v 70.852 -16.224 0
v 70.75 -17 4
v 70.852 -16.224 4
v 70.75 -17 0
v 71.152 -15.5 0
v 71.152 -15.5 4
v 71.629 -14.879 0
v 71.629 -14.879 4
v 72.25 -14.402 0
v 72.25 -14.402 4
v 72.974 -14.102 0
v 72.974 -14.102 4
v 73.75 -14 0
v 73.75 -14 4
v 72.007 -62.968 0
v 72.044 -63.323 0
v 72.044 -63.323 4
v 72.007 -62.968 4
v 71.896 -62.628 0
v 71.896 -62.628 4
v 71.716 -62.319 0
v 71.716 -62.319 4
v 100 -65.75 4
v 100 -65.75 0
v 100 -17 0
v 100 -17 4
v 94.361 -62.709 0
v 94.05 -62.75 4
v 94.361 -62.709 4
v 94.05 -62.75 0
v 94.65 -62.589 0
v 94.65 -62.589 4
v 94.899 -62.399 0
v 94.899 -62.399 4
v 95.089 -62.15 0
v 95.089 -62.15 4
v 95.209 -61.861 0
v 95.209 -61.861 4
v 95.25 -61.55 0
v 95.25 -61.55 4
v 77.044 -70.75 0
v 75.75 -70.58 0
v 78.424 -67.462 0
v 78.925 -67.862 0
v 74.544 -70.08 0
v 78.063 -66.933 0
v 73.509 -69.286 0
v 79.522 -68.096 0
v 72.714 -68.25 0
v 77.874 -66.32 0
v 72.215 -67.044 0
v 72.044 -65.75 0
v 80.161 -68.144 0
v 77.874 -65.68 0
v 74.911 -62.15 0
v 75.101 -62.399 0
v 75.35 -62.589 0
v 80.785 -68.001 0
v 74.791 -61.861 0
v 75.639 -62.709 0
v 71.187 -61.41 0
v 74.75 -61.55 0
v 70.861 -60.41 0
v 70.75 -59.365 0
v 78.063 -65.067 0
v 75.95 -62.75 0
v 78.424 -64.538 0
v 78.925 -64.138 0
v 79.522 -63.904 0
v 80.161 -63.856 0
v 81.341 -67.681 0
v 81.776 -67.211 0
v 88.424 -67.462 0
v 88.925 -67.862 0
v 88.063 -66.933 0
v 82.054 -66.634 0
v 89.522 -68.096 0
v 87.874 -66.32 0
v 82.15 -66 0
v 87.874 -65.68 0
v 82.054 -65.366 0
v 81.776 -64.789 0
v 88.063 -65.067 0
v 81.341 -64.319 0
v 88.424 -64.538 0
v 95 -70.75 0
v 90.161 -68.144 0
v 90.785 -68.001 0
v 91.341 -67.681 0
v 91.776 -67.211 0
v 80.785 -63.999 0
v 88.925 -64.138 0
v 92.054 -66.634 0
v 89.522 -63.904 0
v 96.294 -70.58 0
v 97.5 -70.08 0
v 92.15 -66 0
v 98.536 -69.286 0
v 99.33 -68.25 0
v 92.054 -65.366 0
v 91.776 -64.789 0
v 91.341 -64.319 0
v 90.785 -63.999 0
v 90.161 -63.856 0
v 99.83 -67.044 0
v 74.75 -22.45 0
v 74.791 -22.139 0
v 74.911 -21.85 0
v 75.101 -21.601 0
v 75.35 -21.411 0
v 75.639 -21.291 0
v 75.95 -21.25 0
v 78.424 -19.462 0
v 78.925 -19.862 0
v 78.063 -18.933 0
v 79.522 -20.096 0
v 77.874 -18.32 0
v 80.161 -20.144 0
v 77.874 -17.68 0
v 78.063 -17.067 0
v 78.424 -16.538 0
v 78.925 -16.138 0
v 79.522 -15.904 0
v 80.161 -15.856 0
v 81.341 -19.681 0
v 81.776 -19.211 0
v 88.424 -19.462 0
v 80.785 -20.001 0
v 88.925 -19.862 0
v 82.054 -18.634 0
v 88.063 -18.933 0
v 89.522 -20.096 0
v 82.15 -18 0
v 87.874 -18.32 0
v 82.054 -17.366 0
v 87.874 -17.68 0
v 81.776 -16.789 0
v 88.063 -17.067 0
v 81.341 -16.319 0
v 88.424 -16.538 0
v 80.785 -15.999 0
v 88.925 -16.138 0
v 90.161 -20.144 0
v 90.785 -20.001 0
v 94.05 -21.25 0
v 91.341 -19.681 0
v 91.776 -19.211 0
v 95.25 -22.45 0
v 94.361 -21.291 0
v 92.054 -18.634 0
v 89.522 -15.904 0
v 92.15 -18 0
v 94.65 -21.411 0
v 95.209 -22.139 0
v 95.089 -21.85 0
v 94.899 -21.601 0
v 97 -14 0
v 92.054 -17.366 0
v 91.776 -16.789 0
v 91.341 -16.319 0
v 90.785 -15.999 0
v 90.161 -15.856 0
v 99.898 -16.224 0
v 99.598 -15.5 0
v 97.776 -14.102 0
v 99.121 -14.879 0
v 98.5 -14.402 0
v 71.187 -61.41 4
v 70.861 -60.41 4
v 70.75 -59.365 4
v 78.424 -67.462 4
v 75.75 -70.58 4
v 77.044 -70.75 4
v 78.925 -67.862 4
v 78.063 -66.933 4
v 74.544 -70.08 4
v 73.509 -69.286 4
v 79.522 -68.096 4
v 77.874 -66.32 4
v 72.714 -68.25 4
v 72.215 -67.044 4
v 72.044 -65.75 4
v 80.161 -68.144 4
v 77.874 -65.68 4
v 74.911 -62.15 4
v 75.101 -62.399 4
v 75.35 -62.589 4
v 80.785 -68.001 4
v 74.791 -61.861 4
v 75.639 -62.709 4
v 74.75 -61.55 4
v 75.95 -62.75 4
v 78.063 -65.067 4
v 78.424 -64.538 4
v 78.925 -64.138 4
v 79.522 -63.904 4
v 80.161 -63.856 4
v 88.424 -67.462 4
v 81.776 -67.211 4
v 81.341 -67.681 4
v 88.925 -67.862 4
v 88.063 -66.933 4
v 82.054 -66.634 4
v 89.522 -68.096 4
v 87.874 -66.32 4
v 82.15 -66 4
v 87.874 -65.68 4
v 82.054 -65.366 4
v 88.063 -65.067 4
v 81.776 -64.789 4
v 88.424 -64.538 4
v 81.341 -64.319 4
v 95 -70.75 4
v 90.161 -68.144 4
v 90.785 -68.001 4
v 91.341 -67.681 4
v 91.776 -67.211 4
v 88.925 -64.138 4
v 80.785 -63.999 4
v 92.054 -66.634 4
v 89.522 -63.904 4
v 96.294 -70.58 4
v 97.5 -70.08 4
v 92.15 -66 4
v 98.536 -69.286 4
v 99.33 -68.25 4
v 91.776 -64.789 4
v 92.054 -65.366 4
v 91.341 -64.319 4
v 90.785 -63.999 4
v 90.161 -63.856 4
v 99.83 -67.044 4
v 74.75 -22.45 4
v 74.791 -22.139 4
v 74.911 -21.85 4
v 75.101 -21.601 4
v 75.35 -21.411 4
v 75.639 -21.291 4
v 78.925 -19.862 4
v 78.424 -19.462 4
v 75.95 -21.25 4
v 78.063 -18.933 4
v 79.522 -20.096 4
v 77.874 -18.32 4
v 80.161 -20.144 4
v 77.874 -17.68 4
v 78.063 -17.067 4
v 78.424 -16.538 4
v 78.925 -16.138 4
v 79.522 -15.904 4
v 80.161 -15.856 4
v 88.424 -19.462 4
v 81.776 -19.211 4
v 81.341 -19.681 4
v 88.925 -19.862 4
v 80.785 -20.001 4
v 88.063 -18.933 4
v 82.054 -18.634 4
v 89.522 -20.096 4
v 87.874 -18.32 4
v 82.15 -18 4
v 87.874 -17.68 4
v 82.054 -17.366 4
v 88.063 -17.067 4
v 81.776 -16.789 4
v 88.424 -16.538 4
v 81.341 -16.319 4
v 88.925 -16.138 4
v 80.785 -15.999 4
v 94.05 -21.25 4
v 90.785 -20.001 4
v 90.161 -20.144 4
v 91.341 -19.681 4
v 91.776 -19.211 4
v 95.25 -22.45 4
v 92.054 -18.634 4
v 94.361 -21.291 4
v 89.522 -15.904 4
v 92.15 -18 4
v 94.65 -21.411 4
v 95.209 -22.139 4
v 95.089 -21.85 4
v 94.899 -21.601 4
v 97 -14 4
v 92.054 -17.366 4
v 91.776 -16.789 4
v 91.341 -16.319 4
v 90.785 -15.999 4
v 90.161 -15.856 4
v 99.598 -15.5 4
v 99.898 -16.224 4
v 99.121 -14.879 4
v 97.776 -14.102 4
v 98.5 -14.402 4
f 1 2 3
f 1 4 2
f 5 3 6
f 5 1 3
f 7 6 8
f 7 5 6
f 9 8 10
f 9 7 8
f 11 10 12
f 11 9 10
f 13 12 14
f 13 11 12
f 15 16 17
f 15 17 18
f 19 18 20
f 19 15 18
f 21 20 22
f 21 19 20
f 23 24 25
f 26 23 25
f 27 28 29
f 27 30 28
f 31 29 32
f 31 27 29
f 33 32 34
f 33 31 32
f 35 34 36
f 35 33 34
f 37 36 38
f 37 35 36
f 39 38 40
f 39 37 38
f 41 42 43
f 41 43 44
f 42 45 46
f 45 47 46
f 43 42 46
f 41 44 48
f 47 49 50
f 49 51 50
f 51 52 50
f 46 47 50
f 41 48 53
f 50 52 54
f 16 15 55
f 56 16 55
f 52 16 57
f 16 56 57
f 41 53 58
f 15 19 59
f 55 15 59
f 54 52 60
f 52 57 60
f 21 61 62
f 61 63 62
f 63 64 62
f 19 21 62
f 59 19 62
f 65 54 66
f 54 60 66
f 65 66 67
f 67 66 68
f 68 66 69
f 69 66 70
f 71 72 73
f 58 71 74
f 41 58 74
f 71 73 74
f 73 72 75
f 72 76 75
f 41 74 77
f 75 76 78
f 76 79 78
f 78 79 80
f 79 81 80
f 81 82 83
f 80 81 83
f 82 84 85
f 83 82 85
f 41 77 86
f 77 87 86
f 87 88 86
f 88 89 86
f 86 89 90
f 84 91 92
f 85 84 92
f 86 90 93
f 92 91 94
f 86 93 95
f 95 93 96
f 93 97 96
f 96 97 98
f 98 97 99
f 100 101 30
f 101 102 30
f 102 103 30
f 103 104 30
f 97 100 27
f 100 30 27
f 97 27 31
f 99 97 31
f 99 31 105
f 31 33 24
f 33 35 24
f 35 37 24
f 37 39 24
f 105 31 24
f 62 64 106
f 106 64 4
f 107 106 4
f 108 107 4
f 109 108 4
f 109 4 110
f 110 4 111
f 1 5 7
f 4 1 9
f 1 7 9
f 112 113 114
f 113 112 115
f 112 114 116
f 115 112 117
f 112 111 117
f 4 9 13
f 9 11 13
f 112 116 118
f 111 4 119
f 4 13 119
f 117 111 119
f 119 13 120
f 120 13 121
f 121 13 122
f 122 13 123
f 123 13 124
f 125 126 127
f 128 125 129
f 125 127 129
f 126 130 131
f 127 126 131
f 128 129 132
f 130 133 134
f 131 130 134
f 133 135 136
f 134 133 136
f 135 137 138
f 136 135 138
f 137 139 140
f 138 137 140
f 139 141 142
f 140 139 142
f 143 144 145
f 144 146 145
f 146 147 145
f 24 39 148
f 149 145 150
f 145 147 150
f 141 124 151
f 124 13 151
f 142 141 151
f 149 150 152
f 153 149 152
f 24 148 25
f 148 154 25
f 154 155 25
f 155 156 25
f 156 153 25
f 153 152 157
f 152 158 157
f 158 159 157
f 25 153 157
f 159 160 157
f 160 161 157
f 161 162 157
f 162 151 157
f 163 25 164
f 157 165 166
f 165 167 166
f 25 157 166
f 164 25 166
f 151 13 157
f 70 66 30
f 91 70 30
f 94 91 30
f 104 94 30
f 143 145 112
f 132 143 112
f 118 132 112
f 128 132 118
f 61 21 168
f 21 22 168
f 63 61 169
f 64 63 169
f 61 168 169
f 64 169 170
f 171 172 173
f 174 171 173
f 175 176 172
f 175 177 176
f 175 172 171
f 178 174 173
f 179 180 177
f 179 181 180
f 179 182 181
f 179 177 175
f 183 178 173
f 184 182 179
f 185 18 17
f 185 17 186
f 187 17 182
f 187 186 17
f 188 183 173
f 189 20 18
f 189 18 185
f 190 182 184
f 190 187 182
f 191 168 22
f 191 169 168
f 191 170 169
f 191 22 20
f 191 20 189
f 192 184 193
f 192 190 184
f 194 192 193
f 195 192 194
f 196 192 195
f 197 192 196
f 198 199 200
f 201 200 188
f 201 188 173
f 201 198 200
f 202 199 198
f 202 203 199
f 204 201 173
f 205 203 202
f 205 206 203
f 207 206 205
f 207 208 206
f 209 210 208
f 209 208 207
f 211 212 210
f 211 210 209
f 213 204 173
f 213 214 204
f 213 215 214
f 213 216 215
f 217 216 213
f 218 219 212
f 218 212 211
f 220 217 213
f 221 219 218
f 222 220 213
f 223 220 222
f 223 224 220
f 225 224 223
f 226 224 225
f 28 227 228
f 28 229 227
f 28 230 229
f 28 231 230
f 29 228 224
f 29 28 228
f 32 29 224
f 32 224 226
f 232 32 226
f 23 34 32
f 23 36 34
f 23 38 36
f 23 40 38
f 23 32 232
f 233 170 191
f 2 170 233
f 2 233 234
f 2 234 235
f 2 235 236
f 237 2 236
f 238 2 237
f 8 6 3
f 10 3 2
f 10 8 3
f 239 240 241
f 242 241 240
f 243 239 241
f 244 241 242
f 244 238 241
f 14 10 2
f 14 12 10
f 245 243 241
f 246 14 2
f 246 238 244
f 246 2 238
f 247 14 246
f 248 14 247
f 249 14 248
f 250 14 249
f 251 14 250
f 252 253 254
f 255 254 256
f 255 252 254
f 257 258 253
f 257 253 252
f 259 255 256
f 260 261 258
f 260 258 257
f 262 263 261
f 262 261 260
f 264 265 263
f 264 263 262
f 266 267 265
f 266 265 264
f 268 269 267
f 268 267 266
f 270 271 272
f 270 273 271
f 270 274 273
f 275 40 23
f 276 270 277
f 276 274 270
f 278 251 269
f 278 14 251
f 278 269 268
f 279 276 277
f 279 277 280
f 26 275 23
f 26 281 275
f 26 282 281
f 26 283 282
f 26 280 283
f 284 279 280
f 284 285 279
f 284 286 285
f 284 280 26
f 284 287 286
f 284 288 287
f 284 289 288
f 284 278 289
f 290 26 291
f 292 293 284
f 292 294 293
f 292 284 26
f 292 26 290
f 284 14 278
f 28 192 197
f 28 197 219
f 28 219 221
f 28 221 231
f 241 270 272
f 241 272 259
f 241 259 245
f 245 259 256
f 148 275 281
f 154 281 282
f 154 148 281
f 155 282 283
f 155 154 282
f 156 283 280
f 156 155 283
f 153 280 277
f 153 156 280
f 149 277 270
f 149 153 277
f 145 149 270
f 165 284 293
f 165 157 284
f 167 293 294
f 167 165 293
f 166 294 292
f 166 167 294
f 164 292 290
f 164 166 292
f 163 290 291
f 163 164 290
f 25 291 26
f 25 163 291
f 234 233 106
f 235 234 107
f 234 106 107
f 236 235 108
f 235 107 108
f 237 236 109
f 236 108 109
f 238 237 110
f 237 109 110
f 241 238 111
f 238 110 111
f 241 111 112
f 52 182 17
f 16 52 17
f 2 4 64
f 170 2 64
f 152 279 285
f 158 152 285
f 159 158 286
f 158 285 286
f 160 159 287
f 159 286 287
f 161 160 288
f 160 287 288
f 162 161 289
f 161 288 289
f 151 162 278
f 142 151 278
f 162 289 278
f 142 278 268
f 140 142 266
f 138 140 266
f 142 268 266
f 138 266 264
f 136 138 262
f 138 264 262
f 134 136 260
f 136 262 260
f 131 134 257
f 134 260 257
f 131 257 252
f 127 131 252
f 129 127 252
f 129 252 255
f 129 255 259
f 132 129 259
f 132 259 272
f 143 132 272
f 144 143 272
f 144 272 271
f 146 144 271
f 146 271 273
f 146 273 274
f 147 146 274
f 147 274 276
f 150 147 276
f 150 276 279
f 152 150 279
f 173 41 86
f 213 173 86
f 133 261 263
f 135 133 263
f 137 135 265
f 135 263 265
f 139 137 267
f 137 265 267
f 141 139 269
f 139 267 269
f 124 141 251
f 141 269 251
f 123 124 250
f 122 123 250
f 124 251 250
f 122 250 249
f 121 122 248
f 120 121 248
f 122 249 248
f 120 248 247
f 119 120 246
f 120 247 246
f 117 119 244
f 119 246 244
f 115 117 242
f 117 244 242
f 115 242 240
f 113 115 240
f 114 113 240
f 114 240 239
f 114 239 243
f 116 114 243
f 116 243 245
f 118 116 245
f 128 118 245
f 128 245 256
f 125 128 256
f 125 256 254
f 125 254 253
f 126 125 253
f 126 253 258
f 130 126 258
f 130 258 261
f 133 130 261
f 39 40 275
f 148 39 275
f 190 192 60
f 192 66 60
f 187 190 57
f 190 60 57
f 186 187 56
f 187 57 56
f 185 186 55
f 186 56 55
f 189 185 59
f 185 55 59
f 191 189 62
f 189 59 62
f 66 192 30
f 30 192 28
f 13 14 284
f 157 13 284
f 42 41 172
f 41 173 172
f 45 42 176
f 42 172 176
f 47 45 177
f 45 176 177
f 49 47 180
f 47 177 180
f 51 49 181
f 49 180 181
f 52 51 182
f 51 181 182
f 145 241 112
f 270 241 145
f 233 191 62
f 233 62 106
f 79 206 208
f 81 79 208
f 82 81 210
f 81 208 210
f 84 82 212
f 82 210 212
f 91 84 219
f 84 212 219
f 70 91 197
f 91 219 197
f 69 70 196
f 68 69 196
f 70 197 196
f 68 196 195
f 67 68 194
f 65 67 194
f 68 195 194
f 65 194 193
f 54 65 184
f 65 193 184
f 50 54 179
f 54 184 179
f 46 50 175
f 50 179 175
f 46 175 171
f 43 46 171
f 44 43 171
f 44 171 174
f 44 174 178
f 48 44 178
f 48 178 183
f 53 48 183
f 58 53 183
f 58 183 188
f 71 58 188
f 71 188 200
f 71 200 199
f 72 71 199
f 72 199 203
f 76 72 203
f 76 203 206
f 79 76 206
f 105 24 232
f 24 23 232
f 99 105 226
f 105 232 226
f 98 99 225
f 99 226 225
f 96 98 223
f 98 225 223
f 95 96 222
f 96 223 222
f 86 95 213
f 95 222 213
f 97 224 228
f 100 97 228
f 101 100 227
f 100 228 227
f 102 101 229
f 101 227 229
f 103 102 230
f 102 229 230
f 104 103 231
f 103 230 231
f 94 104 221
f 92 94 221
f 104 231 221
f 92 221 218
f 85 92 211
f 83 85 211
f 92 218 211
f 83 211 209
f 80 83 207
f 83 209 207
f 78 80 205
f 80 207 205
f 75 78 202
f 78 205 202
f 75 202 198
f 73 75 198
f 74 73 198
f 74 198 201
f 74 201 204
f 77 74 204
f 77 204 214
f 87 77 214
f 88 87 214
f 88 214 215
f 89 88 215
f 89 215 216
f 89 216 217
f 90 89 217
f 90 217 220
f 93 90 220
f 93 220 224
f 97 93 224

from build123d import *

# Parameters (mm, degrees)
SKETCH_1_W           = 100
SKETCH_1_H           = 100
EXTRUDE_1_DEPTH      = 4
SKETCH_2_R           = 2.15
CUT_EXTRUDE_1_DEPTH  = 142.477913471
SKETCH_3_R           = 1.65
CUT_EXTRUDE_2_DEPTH  = 142.477913471
SKETCH_4_R           = 1.65
CUT_EXTRUDE_3_DEPTH  = 142.477913471
SKETCH_5_W           = 20.5
SKETCH_5_H           = 41.5
CUT_EXTRUDE_4_DEPTH  = 10
SKETCH_6_W           = 55
SKETCH_6_H           = 100
CUT_EXTRUDE_5_DEPTH  = 10
FILLET_2_R           = 1.2
SKETCH_8_R           = 1.65
CUT_EXTRUDE_6_DEPTH  = 142.477913471
SKETCH_9_W           = 15.75
SKETCH_9_H           = 78.5
CUT_EXTRUDE_7_DEPTH  = 142.477913471
CUT_EXTRUDE_8_DEPTH  = 10
FILLET_5_R           = 3
SKETCH_11_W          = 29.25
SKETCH_11_H          = 14
CUT_EXTRUDE_9_DEPTH  = 10
FILLET_7_R           = 3
SKETCH_12_R          = 1.65
CUT_EXTRUDE_10_DEPTH = 10
FILLET_8_R           = 3
EXTRUDE_2_DEPTH      = 4
FILLET_9_R           = 5
CUT_EXTRUDE_11_DEPTH = 10
FILLET_10_R          = 1.7
SKETCH_15_R          = 1.65
CUT_EXTRUDE_12_DEPTH = 10
FILLET_11_R          = 5


with BuildPart() as part:
    # 草图1 → 凸台-拉伸1 (new body)
    with BuildSketch(Plane.XY):
        with Locations((50, -50)):
            Rectangle(SKETCH_1_W, SKETCH_1_H)
    extrude(amount=EXTRUDE_1_DEPTH)

    # 草图2 → 切除-拉伸1 (cut, through all)
    with BuildSketch(Plane.XY.offset(4)):
        with Locations((80, -66)):
            Circle(SKETCH_2_R)
        with Locations((90, -66)):
            Circle(SKETCH_2_R)
        with Locations((90, -18)):
            Circle(SKETCH_2_R)
        with Locations((80, -18)):
            Circle(SKETCH_2_R)
    extrude(amount=-CUT_EXTRUDE_1_DEPTH, mode=Mode.SUBTRACT)

    # 草图3 → 切除-拉伸2 (cut, through all)
    with BuildSketch(Plane.XY.offset(4)):
        with Locations((73, -95)):
            Circle(SKETCH_3_R)
        with Locations((73, -85)):
            Circle(SKETCH_3_R)
        with Locations((85, -85)):
            Circle(SKETCH_3_R)
        with Locations((85, -95)):
            Circle(SKETCH_3_R)
    extrude(amount=-CUT_EXTRUDE_2_DEPTH, mode=Mode.SUBTRACT)

    # 草图4 → 切除-拉伸3 (cut, through all)
    with BuildSketch(Plane.XY.offset(4)):
        with BuildLine():
            ThreePointArc((81, -100), (71.5, -90.5), (62, -100))
            Line((62, -100), (81, -100))
        make_face()
        with Locations((73, -95)):
            Circle(SKETCH_4_R, mode=Mode.SUBTRACT)
    extrude(amount=-CUT_EXTRUDE_3_DEPTH, mode=Mode.SUBTRACT)

    # 草图5 → 切除-拉伸4 (cut)
    with BuildSketch(Plane.XY.offset(4)):
        with Locations((85, -42)):
            Rectangle(SKETCH_5_W, SKETCH_5_H)
    extrude(amount=-CUT_EXTRUDE_4_DEPTH, mode=Mode.SUBTRACT)

    # 草图6 → 切除-拉伸5 (cut)
    with BuildSketch(Plane.XY.offset(4)):
        with Locations((27.5, -50)):
            Rectangle(SKETCH_6_W, SKETCH_6_H)
    extrude(amount=-CUT_EXTRUDE_5_DEPTH, mode=Mode.SUBTRACT)

    # 圆角2
    fillet_2_edges = [part.edges().sort_by_distance(p)[0] for p in [
        (95.25, -62.75, 2),
        (74.75, -62.75, 2),
        (74.75, -21.25, 2),
        (95.25, -21.25, 2),
    ]]
    fillet(fillet_2_edges, radius=FILLET_2_R)

    # 草图8 → 切除-拉伸6 (cut, through all)
    with BuildSketch(Plane.XY.offset(4)):
        with Locations((59, -85)):
            Circle(SKETCH_8_R)
    extrude(amount=-CUT_EXTRUDE_6_DEPTH, mode=Mode.SUBTRACT)

    # 草图9 → 切除-拉伸7 (cut, through all)
    with BuildSketch(Plane.XY.offset(4)):
        with BuildLine():
            Line((71.5, -90.5), (55, -90.5))
            Line((55, -90.5), (55, -100))
            Line((55, -100), (62, -100))
            ThreePointArc((62, -100), (64.782485579, -93.282485579), (71.5, -90.5))
        make_face()
        with Locations((62.875, -39.25)):
            Rectangle(SKETCH_9_W, SKETCH_9_H)
    extrude(amount=-CUT_EXTRUDE_7_DEPTH, mode=Mode.SUBTRACT)

    # 草图10 → 切除-拉伸8 (cut)
    with BuildSketch(Plane.XY.offset(4)):
        with BuildLine():
            Line((100, -87.5), (55, -87.5))
            Line((55, -87.5), (55, -90.5))
            Line((55, -90.5), (71.5, -90.5))
            ThreePointArc((71.5, -90.5), (78.217514421, -93.282485579), (81, -100))
            Line((81, -100), (100, -100))
            Line((100, -100), (100, -87.5))
        make_face()
    extrude(amount=-CUT_EXTRUDE_8_DEPTH, mode=Mode.SUBTRACT)

    # 圆角5
    fillet_5_edges = [part.edges().sort_by_distance(p)[0] for p in [
        (100, -87.5, 2),
        (55, -87.5, 2),
    ]]
    fillet(fillet_5_edges, radius=FILLET_5_R)

    # 草图11 → 切除-拉伸9 (cut)
    with BuildSketch(Plane.XY.offset(4)):
        with Locations((85.375, -7)):
            Rectangle(SKETCH_11_W, SKETCH_11_H)
    extrude(amount=-CUT_EXTRUDE_9_DEPTH, mode=Mode.SUBTRACT)

    # 圆角7
    fillet_7_edges = [part.edges().sort_by_distance(p)[0] for p in [
        (70.75, -14, 2),
        (100, -14, 2),
    ]]
    fillet(fillet_7_edges, radius=FILLET_7_R)

    # 草图12 → 切除-拉伸10 (cut)
    with BuildSketch(Plane.XY.offset(4)):
        with BuildLine():
            Line((64.339745962, -87.5), (81.660254038, -87.5))
            ThreePointArc((81.660254038, -87.5), (73, -82.5), (64.339745962, -87.5))
        make_face()
        with Locations((73, -85)):
            Circle(SKETCH_12_R, mode=Mode.SUBTRACT)
    extrude(amount=-CUT_EXTRUDE_10_DEPTH, mode=Mode.SUBTRACT)

    # 圆角8
    fillet_8_edges = [part.edges().sort_by_distance(p)[0] for p in [
        (64.339745962, -87.5, 2),
        (81.660254038, -87.5, 2),
    ]]
    fillet(fillet_8_edges, radius=FILLET_8_R)

    # 草图13 → 凸台-拉伸2 (add)
    with BuildSketch(Plane.XY.offset(4)):
        Polygon((70.75, -51.220199781), (55, -78.5), (70.75, -78.5), align=None)
    extrude(amount=-EXTRUDE_2_DEPTH)

    # 圆角9
    fillet_9_edges = [part.edges().sort_by_distance(p)[0] for p in [
        (55, -78.5, 2),
        (70.75, -51.220199781, 2),
    ]]
    fillet(fillet_9_edges, radius=FILLET_9_R)

    # 草图14 → 切除-拉伸11 (cut)
    with BuildSketch(Plane.XY.offset(4)):
        Polygon((72.044228634, -79.339745962), (72.044228634, -56.97853003), (59.133974596, -79.339745962), align=None)
    extrude(amount=-CUT_EXTRUDE_11_DEPTH, mode=Mode.SUBTRACT)

    # 圆角10
    fillet_10_edges = [part.edges().sort_by_distance(p)[0] for p in [
        (72.044228634, -79.339745962, 2),
        (59.133974596, -79.339745962, 2),
        (72.044228634, -56.97853003, 2),
    ]]
    fillet(fillet_10_edges, radius=FILLET_10_R)

    # 草图15 → 切除-拉伸12 (cut)
    # profile 1 of 4: a face of its own
    with BuildSketch(Plane(origin=(0, 0, 0), x_dir=(-1, 0, 0), z_dir=(0, 0, -1))):
        with BuildLine():
            Line((-59.474464586, -70.75), (-55.667552662, -70.75))
            Line((-55.667552662, -70.75), (-55.667552662, -49.880453819))
            Line((-55.667552662, -49.880453819), (-70.75, -49.880453819))
            ThreePointArc((-70.75, -49.880453819), (-70.579629131, -51.174549044), (-70.080127019, -52.380453819))
            Line((-70.080127019, -52.380453819), (-59.474464586, -70.75))
        make_face()
    # profile 2 of 4: a face of its own
    with BuildSketch(Plane(origin=(0, 0, 0), x_dir=(-1, 0, 0), z_dir=(0, 0, -1))):
        with BuildLine():
            Line((-41.658398954, -70.75), (-55.667552662, -70.75))
            Line((-55.667552662, -70.75), (-59.474464586, -70.75))
            Line((-59.474464586, -70.75), (-55.669872981, -77.339745962))
            ThreePointArc((-55.669872981, -77.339745962), (-55.170370869, -78.545650737), (-55, -79.839745962))
            Line((-55, -79.839745962), (-55, -84.5))
            ThreePointArc((-55, -84.5), (-55.878679656, -86.621320344), (-58, -87.5))
            Line((-58, -87.5), (-62.753049234, -87.5))
            ThreePointArc((-62.753049234, -87.5), (-64.068636263, -87.196151103), (-65.11773018, -86.346153846))
            ThreePointArc((-65.11773018, -86.346153846), (-73, -82.5), (-80.88226982, -86.346153846))
            ThreePointArc((-80.88226982, -86.346153846), (-81.931363737, -87.196151103), (-83.246950766, -87.5))
            Line((-83.246950766, -87.5), (-97, -87.5))
            ThreePointArc((-97, -87.5), (-99.121320344, -86.621320344), (-100, -84.5))
            Line((-100, -84.5), (-100, -90.078728051))
            Line((-100, -90.078728051), (-41.658398954, -90.078728051))
            Line((-41.658398954, -90.078728051), (-41.658398954, -70.75))
        make_face()
    # profile 3 of 4: a face of its own
    with BuildSketch(Plane(origin=(0, 0, 0), x_dir=(-1, 0, 0), z_dir=(0, 0, -1))):
        with BuildLine():
            Line((-55.669872981, -77.339745962), (-59.474464586, -70.75))
            Line((-59.474464586, -70.75), (-64.09326674, -70.75))
            Line((-64.09326674, -70.75), (-60.606217783, -76.789745962))
            ThreePointArc((-60.606217783, -76.789745962), (-60.606217783, -78.489745962), (-62.078460969, -79.339745962))
            Line((-62.078460969, -79.339745962), (-70.344228634, -79.339745962))
            ThreePointArc((-70.344228634, -79.339745962), (-71.546310162, -78.84182749), (-72.044228634, -77.639745962))
            Line((-72.044228634, -77.639745962), (-72.044228634, -70.75))
            Line((-72.044228634, -70.75), (-100, -70.75))
            Line((-100, -70.75), (-100, -84.5))
            ThreePointArc((-100, -84.5), (-99.121320344, -86.621320344), (-97, -87.5))
            Line((-97, -87.5), (-83.246950766, -87.5))
            ThreePointArc((-83.246950766, -87.5), (-81.931363737, -87.196151103), (-80.88226982, -86.346153846))
            ThreePointArc((-80.88226982, -86.346153846), (-73, -82.5), (-65.11773018, -86.346153846))
            ThreePointArc((-65.11773018, -86.346153846), (-64.068636263, -87.196151103), (-62.753049234, -87.5))
            Line((-62.753049234, -87.5), (-58, -87.5))
            ThreePointArc((-58, -87.5), (-55.878679656, -86.621320344), (-55, -84.5))
            Line((-55, -84.5), (-55, -79.839745962))
            ThreePointArc((-55, -79.839745962), (-55.170370869, -78.545650737), (-55.669872981, -77.339745962))
        make_face()
        with Locations((-85, -85)):
            Circle(SKETCH_15_R, mode=Mode.SUBTRACT)
        with Locations((-59, -85)):
            Circle(SKETCH_15_R, mode=Mode.SUBTRACT)
    # profile 4 of 4: a face of its own
    with BuildSketch(Plane(origin=(0, 0, 0), x_dir=(-1, 0, 0), z_dir=(0, 0, -1))):
        with BuildLine():
            Line((-64.09326674, -70.75), (-59.474464586, -70.75))
            Line((-59.474464586, -70.75), (-70.080127019, -52.380453819))
            ThreePointArc((-70.080127019, -52.380453819), (-70.579629131, -51.174549044), (-70.75, -49.880453819))
            Line((-70.75, -49.880453819), (-70.75, -61.672153114))
            ThreePointArc((-70.75, -61.672153114), (-69.677380797, -61.759266435), (-68.871985448, -62.473016403))
            Line((-68.871985448, -62.473016403), (-64.09326674, -70.75))
        make_face()
    extrude(amount=-CUT_EXTRUDE_12_DEPTH, mode=Mode.SUBTRACT)

    # 圆角11
    fillet_11_edges = [part.edges().sort_by_distance(p)[0] for p in [
        (70.75, -61.672153114, 2),
        (100, -70.75, 2),
        (72.044228634, -70.75, 2),
    ]]
    fillet(fillet_11_edges, radius=FILLET_11_R)


solid = part.part
